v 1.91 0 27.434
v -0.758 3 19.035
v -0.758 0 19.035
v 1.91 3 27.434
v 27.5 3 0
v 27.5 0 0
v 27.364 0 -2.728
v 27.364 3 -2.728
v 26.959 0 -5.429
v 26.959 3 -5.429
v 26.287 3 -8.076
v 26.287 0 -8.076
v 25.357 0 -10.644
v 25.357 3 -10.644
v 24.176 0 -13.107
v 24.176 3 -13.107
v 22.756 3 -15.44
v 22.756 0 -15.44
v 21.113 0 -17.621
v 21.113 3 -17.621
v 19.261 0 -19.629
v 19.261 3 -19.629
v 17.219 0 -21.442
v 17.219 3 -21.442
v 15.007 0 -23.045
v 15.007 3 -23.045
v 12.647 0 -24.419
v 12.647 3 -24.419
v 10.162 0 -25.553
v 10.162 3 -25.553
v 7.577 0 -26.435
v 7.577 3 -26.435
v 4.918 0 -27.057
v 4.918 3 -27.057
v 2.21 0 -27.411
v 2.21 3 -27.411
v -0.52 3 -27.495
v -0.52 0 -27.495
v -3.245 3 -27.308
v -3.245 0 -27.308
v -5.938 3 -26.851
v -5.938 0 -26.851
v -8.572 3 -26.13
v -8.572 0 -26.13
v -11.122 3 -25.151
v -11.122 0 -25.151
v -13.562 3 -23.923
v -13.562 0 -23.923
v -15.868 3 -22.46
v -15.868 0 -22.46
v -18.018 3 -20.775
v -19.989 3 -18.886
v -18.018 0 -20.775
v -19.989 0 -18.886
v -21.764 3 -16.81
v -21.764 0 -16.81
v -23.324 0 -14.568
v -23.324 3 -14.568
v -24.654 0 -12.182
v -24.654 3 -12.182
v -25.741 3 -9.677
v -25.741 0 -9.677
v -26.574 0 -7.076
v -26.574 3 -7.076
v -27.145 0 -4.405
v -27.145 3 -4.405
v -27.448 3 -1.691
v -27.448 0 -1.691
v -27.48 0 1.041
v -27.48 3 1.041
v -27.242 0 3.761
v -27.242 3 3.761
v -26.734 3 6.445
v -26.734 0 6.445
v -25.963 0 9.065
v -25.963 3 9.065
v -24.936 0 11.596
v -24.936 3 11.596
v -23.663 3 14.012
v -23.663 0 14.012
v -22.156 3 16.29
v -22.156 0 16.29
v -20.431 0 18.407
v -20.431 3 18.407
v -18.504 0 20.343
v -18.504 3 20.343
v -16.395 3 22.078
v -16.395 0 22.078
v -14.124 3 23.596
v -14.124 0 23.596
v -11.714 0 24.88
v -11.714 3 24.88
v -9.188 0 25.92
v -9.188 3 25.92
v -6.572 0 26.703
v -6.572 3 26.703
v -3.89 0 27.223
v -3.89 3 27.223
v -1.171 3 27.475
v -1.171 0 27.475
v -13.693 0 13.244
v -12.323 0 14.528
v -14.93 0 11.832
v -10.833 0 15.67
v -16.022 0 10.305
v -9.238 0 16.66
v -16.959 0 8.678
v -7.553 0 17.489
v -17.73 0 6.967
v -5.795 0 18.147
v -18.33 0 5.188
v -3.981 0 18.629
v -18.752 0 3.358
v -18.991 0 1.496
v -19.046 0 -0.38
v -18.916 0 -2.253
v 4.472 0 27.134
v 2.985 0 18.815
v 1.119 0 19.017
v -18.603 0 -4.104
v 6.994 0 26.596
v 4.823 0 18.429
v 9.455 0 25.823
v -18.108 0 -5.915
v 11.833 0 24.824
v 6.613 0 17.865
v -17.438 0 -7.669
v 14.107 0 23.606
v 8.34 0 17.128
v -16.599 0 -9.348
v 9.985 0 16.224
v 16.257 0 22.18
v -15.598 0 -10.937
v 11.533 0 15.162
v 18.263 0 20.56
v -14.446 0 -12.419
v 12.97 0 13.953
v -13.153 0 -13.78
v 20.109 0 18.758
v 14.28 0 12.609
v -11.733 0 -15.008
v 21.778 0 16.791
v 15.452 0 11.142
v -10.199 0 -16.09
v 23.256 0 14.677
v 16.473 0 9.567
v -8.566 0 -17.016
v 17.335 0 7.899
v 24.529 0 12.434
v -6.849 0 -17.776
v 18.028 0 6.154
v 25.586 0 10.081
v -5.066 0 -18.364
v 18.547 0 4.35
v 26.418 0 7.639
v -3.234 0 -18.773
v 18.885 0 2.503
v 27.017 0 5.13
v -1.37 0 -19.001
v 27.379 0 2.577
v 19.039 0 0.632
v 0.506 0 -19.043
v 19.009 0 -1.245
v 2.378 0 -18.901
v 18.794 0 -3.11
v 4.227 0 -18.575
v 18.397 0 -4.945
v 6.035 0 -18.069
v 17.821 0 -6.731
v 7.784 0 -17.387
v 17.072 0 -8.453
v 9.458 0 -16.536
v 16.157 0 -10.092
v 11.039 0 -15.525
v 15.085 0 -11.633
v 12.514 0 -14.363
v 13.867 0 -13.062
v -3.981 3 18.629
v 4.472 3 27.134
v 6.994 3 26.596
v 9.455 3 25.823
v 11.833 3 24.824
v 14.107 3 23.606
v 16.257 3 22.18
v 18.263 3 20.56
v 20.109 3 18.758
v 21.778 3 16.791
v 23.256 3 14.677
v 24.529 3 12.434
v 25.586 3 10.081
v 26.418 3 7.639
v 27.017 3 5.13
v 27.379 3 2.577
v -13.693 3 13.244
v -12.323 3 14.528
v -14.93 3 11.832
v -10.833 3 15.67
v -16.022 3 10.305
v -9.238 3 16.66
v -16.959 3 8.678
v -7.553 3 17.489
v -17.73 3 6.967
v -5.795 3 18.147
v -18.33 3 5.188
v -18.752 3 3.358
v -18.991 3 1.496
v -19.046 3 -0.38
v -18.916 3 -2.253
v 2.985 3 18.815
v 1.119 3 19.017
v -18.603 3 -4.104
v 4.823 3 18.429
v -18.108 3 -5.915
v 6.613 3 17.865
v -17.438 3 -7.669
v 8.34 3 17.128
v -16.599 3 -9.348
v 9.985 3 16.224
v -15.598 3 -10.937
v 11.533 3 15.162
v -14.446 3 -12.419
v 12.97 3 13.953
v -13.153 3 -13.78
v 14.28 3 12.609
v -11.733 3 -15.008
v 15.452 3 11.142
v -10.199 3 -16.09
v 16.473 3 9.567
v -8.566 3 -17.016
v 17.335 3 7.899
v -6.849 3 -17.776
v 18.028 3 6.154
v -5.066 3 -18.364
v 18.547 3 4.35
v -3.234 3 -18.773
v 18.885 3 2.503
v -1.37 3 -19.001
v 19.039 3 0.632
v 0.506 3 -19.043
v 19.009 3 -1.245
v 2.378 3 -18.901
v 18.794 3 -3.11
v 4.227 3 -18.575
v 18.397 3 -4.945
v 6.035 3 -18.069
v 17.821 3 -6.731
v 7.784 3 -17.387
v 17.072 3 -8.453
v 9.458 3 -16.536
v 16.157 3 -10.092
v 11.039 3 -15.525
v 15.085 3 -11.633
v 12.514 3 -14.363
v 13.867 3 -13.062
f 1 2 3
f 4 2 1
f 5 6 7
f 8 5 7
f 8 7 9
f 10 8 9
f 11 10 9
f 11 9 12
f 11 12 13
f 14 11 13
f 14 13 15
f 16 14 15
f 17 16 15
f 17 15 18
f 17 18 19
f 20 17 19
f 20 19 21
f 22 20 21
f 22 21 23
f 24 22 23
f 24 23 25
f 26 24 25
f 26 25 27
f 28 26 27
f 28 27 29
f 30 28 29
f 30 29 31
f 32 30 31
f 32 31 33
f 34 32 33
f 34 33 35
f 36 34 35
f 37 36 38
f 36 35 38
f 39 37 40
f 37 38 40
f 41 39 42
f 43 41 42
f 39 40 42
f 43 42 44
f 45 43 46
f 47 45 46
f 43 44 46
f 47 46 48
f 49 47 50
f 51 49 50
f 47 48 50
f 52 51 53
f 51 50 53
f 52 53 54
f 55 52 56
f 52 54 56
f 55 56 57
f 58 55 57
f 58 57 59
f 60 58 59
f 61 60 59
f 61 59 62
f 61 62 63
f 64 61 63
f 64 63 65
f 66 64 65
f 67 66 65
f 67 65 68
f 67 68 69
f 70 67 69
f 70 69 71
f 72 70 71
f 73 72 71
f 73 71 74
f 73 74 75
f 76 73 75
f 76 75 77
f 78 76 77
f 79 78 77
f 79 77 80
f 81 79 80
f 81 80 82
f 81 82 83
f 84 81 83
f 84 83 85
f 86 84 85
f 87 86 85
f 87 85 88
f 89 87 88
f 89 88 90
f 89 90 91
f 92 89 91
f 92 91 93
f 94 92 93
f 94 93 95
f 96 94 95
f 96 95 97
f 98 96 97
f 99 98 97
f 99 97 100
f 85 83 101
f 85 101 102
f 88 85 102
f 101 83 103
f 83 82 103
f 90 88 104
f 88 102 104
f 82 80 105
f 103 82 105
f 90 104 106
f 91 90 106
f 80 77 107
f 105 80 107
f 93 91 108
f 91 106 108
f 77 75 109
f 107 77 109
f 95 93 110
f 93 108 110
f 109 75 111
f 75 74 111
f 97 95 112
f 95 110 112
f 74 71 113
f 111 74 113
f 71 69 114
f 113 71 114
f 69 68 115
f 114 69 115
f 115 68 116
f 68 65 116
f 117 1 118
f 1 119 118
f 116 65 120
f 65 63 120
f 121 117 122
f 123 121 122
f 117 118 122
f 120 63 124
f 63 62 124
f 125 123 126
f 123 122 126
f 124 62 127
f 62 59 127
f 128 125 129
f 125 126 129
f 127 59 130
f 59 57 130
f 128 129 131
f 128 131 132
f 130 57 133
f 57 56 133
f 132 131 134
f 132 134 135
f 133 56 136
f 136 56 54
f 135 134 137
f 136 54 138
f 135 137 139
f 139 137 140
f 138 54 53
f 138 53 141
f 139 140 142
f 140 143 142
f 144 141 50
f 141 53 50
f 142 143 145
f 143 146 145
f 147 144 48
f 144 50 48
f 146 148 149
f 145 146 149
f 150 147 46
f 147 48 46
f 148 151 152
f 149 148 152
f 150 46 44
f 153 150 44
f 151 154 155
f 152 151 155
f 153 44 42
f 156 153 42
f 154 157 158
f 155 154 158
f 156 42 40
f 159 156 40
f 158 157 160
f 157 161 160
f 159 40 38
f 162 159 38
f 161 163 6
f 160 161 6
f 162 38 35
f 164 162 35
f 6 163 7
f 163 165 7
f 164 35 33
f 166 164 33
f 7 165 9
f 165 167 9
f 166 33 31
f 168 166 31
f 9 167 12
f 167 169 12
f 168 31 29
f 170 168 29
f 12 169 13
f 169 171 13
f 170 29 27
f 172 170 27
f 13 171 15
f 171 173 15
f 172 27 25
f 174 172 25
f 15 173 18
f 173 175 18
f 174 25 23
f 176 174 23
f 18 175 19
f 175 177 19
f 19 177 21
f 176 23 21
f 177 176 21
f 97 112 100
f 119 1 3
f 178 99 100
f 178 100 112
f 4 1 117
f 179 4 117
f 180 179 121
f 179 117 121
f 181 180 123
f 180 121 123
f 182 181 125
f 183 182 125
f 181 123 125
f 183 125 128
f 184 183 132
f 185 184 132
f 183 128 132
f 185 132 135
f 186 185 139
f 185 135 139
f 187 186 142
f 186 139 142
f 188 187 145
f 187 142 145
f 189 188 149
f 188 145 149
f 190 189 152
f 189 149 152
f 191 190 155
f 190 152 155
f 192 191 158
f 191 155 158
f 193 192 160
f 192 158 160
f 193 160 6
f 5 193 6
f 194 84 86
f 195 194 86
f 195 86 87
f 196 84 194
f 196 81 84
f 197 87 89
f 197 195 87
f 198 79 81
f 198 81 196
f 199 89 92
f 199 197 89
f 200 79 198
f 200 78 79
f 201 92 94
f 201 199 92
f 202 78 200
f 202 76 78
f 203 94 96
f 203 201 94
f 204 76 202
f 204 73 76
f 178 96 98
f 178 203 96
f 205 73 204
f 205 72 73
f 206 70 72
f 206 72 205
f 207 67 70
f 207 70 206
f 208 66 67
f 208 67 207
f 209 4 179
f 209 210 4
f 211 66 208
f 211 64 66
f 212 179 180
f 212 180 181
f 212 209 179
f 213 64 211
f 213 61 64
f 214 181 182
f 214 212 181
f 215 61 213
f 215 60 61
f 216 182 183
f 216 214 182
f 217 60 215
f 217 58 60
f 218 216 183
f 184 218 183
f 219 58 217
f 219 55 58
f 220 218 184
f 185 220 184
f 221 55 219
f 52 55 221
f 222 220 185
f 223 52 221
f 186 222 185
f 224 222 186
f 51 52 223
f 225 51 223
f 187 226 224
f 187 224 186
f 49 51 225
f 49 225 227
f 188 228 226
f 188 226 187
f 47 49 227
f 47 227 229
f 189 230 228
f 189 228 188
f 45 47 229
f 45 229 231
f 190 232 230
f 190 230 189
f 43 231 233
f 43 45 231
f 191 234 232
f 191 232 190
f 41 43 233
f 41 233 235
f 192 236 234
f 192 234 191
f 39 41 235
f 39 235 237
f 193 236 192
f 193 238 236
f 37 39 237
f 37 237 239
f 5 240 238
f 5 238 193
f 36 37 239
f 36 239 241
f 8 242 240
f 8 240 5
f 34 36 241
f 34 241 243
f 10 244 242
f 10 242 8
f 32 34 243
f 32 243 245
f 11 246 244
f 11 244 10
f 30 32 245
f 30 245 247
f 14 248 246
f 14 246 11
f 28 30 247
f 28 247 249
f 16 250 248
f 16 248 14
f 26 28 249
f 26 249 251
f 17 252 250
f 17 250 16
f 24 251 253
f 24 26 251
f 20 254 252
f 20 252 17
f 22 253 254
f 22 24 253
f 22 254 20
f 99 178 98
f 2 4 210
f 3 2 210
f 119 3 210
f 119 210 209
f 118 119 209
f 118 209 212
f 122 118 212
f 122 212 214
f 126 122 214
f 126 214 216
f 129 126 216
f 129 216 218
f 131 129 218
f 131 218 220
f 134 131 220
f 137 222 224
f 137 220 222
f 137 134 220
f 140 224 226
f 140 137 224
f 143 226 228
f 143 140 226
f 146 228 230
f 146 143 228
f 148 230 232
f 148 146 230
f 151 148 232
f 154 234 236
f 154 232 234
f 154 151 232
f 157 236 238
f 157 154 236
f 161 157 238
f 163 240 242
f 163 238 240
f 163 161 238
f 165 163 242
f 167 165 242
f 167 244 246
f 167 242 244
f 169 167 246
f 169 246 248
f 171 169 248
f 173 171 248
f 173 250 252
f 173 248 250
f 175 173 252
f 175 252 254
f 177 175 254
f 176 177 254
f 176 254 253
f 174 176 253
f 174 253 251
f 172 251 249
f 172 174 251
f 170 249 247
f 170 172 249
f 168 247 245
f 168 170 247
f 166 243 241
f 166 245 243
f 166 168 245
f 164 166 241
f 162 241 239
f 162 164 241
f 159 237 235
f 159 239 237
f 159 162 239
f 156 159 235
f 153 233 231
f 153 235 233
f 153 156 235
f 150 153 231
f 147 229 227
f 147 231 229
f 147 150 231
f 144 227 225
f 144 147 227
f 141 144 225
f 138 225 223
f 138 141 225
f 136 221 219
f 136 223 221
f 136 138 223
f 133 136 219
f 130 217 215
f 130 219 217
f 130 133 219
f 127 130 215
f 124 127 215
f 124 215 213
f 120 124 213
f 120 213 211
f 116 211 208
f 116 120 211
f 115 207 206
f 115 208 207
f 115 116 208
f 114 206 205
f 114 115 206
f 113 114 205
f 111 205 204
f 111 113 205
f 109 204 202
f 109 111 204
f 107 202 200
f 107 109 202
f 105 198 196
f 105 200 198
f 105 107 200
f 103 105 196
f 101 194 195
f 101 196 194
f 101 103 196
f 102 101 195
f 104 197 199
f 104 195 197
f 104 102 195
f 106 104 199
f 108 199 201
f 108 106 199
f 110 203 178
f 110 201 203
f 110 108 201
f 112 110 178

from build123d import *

# Parameters (mm, degrees)
CROQUIS1_R              = 27.5
CROQUIS1_R_2            = 19.05
SALIENTE_EXTRUIR1_DEPTH = 3
CORTAR_EXTRUIR1_DEPTH   = 3


with BuildPart() as part:
    # Croquis1 → Saliente-Extruir1 (new body)
    with BuildSketch(Plane(origin=(0, 0, 0), x_dir=(1, 0, 0), z_dir=(0, 1, 0))):
        Circle(CROQUIS1_R)
        Circle(CROQUIS1_R_2, mode=Mode.SUBTRACT)
    extrude(amount=SALIENTE_EXTRUIR1_DEPTH)

    # Croquis2 → Cortar-Extruir1 (cut)
    with BuildSketch(Plane(origin=(0, 3, 0), x_dir=(1, 0, 0), z_dir=(0, 1, 0))):
        Polygon((-1.170833669, -27.475064122), (-3.980970396, -18.629395447), (-1.170833669, -17.73665701), (2.334832716, -28.771694214), (-0.475304011, -29.664432651), align=None)
    extrude(amount=-CORTAR_EXTRUIR1_DEPTH, mode=Mode.SUBTRACT)


solid = part.part
